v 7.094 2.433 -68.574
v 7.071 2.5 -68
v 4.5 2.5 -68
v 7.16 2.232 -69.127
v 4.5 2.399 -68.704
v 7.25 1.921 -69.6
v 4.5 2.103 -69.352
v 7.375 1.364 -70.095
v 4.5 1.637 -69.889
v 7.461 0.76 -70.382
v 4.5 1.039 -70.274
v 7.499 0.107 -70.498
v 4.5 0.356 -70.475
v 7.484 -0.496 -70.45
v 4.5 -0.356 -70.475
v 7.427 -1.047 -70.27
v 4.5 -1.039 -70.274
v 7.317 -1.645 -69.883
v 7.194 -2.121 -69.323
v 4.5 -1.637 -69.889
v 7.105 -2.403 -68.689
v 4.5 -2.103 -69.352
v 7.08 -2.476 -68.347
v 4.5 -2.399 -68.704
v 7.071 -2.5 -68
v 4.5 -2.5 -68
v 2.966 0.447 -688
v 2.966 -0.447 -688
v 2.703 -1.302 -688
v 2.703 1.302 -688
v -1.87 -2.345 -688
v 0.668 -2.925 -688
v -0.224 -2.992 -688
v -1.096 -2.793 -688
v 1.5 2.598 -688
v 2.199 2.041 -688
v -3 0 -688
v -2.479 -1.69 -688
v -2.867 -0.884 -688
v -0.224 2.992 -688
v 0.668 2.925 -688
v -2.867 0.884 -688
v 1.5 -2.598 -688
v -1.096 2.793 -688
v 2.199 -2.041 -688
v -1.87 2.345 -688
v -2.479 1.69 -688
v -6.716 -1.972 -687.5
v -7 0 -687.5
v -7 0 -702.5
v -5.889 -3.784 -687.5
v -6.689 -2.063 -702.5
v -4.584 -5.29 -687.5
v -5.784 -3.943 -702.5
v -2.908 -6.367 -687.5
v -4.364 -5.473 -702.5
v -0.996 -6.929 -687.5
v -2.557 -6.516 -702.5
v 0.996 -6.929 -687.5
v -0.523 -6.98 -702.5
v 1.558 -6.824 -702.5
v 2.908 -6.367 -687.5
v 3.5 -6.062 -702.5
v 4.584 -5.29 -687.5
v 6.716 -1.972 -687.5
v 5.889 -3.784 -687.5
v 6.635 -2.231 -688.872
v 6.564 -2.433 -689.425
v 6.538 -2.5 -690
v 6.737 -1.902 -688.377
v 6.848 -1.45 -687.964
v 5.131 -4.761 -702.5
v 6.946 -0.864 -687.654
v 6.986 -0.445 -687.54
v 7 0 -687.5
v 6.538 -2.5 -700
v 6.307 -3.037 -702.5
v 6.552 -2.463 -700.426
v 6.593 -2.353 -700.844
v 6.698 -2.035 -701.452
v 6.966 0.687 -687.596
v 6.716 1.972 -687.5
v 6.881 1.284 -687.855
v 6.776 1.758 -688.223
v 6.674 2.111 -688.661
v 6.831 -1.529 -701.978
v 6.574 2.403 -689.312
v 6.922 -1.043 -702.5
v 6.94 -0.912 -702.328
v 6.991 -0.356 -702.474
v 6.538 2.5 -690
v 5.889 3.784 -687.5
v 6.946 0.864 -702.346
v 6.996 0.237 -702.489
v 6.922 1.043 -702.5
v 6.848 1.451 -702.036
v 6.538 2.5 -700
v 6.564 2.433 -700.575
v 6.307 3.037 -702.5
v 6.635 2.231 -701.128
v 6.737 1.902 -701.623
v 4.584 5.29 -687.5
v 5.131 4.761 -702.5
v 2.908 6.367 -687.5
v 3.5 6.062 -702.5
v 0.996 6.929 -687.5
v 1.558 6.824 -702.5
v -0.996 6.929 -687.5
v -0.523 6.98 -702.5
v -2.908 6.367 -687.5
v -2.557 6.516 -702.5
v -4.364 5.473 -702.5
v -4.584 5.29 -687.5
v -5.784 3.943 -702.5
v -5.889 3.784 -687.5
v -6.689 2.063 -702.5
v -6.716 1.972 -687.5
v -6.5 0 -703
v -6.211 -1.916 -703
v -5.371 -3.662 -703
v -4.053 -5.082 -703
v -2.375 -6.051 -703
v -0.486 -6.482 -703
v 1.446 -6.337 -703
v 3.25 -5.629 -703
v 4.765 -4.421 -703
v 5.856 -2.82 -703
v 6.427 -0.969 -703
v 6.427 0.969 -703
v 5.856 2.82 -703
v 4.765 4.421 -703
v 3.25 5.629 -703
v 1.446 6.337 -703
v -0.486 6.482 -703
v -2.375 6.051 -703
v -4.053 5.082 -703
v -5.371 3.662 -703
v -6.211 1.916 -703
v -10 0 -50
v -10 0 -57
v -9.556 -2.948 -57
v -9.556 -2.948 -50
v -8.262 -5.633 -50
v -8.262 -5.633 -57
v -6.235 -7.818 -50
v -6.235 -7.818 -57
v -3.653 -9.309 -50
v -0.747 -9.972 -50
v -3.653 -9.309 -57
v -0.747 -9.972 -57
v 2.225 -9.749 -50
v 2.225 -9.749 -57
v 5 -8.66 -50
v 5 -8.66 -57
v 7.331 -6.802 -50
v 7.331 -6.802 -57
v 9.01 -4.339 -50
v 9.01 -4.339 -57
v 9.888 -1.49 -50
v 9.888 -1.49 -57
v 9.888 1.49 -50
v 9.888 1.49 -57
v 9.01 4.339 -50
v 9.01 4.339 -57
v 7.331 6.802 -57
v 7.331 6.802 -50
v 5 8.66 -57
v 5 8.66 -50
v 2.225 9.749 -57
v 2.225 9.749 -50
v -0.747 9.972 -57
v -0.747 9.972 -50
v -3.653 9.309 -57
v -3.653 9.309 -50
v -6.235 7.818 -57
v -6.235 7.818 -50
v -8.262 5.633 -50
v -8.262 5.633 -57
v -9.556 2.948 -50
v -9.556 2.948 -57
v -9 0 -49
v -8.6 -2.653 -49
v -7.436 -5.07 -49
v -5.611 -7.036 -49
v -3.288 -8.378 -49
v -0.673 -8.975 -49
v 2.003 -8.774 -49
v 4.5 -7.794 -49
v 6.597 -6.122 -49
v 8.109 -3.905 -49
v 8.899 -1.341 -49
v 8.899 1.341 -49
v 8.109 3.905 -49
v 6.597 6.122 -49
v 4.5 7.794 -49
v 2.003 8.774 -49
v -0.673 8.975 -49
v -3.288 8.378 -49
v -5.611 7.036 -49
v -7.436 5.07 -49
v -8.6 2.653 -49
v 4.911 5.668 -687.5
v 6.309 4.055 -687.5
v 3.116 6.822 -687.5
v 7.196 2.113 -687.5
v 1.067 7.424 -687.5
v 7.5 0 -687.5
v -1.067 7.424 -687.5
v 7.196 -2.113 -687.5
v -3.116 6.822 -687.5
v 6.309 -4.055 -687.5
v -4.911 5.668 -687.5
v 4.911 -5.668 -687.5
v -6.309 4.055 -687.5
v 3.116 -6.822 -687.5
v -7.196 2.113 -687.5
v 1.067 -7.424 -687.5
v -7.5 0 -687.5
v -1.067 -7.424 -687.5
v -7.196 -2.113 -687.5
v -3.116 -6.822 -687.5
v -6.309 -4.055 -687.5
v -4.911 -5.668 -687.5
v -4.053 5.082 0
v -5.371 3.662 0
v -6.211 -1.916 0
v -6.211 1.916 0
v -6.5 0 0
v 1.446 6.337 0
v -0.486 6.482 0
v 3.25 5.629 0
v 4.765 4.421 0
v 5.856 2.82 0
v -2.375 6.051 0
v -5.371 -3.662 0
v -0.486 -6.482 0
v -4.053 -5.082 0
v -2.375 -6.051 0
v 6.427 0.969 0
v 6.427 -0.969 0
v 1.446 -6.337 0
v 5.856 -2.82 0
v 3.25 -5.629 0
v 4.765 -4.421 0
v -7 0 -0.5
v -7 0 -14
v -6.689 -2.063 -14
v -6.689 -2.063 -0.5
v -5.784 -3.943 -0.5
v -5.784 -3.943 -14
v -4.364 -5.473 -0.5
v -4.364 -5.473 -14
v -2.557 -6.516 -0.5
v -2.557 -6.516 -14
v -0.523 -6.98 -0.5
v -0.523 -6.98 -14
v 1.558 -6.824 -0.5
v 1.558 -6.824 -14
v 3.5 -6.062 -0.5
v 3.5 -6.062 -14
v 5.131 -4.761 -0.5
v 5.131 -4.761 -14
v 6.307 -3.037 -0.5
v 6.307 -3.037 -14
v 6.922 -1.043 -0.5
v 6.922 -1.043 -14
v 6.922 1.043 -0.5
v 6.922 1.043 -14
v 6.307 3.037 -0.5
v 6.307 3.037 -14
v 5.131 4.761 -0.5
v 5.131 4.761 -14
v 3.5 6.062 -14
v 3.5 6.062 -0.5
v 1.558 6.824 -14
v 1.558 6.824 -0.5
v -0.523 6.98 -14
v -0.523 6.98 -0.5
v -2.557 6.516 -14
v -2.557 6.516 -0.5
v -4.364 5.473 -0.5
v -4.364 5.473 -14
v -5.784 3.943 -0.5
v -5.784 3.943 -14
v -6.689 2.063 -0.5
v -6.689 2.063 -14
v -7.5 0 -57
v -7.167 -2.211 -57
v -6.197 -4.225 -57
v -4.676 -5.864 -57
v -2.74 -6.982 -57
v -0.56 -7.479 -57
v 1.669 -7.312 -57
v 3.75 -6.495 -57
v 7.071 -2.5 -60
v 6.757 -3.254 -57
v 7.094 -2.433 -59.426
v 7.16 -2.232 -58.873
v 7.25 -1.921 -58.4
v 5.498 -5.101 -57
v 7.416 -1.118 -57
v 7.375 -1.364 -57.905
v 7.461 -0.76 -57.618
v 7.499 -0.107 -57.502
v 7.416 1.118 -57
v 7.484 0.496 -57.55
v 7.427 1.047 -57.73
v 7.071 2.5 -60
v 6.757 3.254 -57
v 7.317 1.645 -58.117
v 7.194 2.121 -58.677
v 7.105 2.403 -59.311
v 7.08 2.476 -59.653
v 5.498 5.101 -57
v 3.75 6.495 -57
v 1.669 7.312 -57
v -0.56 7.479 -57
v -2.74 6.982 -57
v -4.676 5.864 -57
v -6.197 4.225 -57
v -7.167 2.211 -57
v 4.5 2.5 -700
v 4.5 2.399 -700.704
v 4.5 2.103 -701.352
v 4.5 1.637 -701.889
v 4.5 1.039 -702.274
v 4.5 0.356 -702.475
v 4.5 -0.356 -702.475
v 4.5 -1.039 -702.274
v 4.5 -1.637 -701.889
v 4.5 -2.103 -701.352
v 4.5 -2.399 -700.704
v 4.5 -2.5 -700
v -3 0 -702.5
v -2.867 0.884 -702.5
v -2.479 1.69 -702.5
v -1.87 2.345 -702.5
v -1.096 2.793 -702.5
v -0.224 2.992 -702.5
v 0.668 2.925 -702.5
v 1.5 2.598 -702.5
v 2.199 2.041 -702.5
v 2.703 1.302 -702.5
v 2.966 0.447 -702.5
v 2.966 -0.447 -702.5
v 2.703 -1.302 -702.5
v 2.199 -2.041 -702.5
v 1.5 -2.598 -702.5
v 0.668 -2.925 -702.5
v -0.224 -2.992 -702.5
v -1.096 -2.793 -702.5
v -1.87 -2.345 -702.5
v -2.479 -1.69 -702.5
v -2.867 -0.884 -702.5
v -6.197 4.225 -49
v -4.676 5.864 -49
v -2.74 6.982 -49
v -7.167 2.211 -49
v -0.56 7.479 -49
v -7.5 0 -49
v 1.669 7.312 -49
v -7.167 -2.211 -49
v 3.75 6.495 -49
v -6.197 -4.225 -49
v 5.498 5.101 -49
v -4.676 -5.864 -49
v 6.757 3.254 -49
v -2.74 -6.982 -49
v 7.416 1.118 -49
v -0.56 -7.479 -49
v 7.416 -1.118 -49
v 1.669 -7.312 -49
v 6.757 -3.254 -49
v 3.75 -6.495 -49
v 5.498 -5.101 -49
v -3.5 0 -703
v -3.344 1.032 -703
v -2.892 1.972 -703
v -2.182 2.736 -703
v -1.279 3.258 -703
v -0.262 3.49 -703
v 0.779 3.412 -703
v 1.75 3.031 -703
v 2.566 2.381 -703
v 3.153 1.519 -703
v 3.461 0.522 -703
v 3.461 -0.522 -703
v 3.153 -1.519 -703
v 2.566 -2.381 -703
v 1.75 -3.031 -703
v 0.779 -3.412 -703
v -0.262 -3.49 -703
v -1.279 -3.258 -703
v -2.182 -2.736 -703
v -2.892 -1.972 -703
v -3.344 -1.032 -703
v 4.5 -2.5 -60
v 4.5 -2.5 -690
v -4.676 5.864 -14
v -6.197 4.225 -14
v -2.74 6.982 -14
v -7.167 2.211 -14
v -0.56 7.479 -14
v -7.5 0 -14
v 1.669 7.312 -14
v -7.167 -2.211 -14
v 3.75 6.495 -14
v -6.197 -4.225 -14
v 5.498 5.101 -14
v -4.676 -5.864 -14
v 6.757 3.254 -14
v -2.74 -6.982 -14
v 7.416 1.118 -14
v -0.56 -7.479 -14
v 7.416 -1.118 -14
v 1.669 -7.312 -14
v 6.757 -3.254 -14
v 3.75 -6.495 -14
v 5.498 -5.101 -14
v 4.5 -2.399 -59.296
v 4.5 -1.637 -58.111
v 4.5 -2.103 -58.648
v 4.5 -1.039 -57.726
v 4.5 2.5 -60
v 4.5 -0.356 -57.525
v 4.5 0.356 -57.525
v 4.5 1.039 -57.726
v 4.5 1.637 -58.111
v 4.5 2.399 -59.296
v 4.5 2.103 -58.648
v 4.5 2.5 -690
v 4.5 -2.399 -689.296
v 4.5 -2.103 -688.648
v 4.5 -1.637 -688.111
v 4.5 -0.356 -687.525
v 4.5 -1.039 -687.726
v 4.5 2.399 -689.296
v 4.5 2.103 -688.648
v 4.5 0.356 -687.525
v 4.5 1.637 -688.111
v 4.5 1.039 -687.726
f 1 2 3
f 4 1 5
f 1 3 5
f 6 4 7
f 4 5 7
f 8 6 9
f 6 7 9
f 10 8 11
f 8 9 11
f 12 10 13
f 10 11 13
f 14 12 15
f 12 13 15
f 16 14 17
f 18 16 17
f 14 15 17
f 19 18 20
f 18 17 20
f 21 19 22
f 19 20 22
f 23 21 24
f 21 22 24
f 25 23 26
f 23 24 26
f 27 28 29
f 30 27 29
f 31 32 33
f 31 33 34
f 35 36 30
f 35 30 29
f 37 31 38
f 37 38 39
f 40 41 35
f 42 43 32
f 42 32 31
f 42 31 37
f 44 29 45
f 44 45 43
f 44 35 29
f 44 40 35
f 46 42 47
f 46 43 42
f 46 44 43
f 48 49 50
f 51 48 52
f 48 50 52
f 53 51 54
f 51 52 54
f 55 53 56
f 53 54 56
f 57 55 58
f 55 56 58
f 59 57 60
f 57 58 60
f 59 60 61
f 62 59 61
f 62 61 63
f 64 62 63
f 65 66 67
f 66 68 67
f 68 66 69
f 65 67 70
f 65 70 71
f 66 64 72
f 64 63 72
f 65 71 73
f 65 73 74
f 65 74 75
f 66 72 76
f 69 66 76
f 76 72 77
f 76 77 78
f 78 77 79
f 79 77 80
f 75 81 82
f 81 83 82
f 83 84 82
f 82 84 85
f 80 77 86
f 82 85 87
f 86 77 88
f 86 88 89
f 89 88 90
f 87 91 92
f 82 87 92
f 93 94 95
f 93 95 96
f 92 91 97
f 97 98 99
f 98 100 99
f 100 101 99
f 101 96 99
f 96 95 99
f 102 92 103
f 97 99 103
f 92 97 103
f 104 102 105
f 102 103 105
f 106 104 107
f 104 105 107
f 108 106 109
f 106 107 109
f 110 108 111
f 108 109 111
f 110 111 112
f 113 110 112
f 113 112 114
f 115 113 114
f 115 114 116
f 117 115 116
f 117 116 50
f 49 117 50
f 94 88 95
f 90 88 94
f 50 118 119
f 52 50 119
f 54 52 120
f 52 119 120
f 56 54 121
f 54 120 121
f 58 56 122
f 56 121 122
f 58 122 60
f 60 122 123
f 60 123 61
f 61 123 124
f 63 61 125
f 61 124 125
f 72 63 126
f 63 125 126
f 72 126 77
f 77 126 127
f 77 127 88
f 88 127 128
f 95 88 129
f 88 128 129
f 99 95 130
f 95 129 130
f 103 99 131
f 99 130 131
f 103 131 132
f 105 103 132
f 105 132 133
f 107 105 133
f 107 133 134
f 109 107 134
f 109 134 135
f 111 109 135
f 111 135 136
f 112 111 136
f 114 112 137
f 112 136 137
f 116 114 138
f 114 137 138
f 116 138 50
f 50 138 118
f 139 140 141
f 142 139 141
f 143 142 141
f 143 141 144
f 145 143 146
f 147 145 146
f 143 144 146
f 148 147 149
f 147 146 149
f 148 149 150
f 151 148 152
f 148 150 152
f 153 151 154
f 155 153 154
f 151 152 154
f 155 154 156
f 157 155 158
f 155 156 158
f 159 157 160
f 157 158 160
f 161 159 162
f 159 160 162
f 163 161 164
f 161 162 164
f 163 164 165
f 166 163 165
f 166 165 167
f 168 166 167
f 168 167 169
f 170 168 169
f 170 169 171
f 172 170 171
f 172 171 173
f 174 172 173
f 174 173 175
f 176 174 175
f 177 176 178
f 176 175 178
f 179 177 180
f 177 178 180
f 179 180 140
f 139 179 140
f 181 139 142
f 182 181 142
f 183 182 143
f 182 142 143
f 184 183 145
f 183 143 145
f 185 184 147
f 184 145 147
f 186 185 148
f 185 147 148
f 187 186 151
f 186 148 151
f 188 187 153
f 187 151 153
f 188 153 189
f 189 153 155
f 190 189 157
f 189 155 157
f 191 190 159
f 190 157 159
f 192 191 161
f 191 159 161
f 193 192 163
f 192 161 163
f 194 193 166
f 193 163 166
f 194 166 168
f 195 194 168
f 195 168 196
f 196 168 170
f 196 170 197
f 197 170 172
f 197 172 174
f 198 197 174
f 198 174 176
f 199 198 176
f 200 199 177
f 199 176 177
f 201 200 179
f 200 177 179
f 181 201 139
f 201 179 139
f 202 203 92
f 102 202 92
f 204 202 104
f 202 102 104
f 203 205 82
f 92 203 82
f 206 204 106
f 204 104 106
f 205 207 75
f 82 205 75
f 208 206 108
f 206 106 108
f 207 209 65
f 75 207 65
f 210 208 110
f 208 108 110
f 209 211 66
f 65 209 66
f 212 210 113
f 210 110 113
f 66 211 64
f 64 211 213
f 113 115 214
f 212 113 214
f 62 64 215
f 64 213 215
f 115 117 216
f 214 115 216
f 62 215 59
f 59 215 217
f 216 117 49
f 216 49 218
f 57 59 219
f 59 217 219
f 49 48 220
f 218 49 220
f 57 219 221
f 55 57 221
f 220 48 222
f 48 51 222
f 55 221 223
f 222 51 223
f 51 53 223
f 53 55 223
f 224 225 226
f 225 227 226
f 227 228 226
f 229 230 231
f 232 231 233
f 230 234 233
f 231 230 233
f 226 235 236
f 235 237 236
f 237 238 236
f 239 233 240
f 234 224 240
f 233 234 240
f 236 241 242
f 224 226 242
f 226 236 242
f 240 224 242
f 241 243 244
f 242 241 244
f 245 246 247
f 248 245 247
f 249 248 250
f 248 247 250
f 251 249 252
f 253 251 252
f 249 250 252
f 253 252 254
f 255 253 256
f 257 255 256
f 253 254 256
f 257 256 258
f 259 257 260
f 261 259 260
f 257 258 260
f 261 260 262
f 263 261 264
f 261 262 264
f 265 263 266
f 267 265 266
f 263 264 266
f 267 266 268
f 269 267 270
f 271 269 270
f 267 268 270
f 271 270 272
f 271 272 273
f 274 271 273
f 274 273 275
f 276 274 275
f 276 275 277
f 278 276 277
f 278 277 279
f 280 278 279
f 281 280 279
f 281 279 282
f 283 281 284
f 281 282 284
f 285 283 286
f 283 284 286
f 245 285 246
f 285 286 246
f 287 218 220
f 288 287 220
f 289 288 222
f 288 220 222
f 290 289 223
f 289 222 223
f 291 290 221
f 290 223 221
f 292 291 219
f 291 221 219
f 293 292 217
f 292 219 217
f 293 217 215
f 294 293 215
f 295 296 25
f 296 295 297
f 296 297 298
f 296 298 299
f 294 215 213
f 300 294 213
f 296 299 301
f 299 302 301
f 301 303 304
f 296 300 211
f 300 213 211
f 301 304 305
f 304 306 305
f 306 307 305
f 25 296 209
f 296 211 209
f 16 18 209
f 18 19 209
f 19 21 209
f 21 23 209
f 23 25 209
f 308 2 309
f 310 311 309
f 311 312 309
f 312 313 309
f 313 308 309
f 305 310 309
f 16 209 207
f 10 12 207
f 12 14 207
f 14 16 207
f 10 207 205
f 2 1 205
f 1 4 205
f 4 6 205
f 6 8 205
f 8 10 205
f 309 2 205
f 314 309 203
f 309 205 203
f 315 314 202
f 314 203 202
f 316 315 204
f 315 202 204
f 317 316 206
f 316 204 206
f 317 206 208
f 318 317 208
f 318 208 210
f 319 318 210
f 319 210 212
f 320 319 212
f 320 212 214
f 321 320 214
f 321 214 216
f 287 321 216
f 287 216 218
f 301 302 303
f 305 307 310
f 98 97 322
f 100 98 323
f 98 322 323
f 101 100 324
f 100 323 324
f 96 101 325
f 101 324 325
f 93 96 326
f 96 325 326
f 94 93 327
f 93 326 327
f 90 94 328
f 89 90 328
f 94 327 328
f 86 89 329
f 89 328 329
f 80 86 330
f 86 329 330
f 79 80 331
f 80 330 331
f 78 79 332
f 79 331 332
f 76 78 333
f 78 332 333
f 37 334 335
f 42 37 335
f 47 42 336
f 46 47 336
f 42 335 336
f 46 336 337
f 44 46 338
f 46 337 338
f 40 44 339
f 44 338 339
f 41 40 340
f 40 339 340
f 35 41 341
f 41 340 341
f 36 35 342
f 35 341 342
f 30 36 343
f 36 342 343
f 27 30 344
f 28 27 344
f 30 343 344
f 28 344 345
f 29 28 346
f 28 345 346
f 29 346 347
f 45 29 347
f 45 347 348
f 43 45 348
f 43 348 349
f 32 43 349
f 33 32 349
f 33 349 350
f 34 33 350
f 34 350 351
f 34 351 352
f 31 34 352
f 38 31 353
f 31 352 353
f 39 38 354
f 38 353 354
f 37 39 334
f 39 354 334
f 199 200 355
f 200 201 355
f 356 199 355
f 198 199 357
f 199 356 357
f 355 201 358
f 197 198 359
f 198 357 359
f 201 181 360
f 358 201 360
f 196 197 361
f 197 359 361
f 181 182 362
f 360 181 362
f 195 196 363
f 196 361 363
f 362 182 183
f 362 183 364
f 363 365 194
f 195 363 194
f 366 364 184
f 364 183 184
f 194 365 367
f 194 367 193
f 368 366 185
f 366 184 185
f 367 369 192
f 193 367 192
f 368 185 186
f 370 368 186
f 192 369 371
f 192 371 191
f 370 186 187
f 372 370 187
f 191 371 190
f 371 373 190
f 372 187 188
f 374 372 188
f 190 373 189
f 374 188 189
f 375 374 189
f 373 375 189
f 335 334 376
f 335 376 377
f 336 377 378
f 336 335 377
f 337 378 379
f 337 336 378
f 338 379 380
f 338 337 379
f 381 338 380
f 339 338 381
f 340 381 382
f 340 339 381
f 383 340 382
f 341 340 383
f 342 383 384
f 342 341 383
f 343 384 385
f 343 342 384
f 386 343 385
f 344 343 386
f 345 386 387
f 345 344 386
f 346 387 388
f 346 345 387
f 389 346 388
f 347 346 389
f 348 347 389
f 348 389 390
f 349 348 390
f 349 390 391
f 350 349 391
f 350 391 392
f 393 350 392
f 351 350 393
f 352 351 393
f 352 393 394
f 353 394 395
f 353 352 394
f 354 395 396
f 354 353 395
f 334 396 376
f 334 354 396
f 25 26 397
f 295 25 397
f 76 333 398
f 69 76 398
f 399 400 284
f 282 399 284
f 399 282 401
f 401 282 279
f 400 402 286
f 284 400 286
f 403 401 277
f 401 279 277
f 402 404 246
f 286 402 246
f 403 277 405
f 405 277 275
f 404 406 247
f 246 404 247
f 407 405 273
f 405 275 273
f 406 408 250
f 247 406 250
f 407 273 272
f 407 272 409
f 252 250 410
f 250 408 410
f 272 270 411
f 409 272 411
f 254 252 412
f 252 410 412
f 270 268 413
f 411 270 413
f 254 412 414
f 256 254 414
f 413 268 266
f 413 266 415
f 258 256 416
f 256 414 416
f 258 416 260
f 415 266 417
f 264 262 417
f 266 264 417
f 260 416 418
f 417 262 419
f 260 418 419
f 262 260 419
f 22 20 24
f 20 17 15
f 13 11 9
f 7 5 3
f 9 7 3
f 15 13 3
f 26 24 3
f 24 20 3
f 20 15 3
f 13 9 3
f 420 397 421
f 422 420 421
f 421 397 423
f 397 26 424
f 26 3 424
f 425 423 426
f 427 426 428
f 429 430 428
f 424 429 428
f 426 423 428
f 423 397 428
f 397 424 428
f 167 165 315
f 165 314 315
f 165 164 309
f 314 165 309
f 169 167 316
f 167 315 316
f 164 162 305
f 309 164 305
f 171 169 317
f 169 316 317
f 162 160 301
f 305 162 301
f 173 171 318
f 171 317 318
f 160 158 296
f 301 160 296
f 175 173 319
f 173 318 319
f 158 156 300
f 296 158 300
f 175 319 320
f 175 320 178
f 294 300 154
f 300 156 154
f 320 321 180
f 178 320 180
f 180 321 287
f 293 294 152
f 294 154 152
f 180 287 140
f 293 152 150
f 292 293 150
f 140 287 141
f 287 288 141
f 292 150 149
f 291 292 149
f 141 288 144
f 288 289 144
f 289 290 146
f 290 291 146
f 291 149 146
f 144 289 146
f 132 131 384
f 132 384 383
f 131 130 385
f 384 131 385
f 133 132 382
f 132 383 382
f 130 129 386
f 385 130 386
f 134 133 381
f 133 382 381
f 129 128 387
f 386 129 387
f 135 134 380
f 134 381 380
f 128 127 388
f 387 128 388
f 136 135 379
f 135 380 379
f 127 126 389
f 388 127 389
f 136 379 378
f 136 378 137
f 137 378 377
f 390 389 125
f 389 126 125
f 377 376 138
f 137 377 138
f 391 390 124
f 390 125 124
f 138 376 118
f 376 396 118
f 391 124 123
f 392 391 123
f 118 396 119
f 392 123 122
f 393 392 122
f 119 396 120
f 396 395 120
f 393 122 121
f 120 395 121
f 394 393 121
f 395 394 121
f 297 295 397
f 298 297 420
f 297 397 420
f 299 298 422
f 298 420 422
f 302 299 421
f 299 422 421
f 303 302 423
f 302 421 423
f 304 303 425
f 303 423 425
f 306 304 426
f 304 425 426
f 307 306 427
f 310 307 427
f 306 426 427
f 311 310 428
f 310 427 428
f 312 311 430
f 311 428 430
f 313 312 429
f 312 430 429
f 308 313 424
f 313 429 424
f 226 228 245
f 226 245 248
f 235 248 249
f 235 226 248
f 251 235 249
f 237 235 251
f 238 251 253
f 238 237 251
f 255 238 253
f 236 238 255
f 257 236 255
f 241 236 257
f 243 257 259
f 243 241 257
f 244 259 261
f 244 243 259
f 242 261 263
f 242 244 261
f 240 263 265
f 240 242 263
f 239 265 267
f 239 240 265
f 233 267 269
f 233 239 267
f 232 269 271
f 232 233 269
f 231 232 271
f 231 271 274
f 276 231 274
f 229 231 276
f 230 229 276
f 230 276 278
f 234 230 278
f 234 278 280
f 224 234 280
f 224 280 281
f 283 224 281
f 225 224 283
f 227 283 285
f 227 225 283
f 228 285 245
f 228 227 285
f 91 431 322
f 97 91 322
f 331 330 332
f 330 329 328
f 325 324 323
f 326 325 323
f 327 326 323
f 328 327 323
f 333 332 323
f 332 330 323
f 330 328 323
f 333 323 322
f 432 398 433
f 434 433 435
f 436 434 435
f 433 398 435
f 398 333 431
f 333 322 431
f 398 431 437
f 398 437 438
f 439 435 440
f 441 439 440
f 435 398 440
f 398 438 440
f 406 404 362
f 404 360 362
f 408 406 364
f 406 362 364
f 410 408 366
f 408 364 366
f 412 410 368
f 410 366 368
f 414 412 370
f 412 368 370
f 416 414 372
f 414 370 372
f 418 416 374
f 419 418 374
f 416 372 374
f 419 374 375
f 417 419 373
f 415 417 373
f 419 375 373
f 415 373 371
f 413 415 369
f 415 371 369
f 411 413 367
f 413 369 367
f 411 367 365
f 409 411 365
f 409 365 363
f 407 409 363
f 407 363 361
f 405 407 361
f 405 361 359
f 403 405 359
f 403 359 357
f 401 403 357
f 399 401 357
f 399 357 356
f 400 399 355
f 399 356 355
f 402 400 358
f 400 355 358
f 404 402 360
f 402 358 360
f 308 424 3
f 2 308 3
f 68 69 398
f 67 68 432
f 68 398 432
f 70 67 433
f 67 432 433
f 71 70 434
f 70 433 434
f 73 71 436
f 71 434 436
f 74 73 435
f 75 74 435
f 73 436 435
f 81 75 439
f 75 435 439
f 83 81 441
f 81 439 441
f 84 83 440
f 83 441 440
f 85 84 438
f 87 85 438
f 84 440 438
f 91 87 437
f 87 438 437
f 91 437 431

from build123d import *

# Parameters (mm, degrees)
CUT_EXTRUDE_1_DEPTH = 704.220626831
CHAMFER_1_SIZE      = 1
SKETCH_3_R          = 3
CUT_EXTRUDE_2_DEPTH = 15
CHAMFER_2_SIZE      = 0.5


with BuildPart() as part:
    # 草图1 → 旋转1 (revolve)
    with BuildSketch(Plane(origin=(0, 0, 0), x_dir=(0, 0, -1), z_dir=(1, 0, 0)), mode=Mode.PRIVATE) as revolve_1_sk:
        Polygon((0, 0), (0, 7), (14, 7), (14, 7.5), (49, 7.5), (49, 10), (57, 10), (57, 7.5), (687.5, 7.5), (687.5, 7), (703, 7), (703, 0), align=None)
    revolve(revolve_1_sk.sketch.rotate(Axis((0, 0, 0), (0, 0, 1)), 90), axis=Axis((0, 0, 0), (0, 0, 1)))

    # 草图2 → 切除-拉伸1 (cut, through all)
    with BuildSketch(Plane(origin=(4.5, 0, 0), x_dir=(0, 0, -1), z_dir=(1, 0, 0))):
        with BuildLine():
            Line((60, 2.5), (68, 2.5))
            ThreePointArc((68, 2.5), (70.5, 0), (68, -2.5))
            Line((68, -2.5), (60, -2.5))
            ThreePointArc((60, -2.5), (57.5, 0), (60, 2.5))
        make_face()
        with BuildLine():
            Line((690, 2.5), (700, 2.5))
            ThreePointArc((700, 2.5), (702.5, 0), (700, -2.5))
            Line((700, -2.5), (690, -2.5))
            ThreePointArc((690, -2.5), (687.5, 0), (690, 2.5))
        make_face()
    extrude(amount=CUT_EXTRUDE_1_DEPTH, mode=Mode.SUBTRACT)

    # 倒角1
    chamfer_1_edges = [part.edges().sort_by_distance(p)[0] for p in [
        (10, 0, -49),
    ]]
    chamfer(chamfer_1_edges, length=CHAMFER_1_SIZE)

    # 草图3 → 切除-拉伸2 (cut)
    with BuildSketch(Plane(origin=(0, 0, -703), x_dir=(-1, 0, 0), z_dir=(0, 0, -1))):
        Circle(SKETCH_3_R)
    extrude(amount=-CUT_EXTRUDE_2_DEPTH, mode=Mode.SUBTRACT)

    # 倒角2
    chamfer_2_edges = [part.edges().sort_by_distance(p)[0] for p in [
        (7, 0, 0),
        (3, 0, -703),
        (7, 0, -703),
    ]]
    chamfer(chamfer_2_edges, length=CHAMFER_2_SIZE - 0.0001)  # a hair under: the kernel refuses the full size


solid = part.part
